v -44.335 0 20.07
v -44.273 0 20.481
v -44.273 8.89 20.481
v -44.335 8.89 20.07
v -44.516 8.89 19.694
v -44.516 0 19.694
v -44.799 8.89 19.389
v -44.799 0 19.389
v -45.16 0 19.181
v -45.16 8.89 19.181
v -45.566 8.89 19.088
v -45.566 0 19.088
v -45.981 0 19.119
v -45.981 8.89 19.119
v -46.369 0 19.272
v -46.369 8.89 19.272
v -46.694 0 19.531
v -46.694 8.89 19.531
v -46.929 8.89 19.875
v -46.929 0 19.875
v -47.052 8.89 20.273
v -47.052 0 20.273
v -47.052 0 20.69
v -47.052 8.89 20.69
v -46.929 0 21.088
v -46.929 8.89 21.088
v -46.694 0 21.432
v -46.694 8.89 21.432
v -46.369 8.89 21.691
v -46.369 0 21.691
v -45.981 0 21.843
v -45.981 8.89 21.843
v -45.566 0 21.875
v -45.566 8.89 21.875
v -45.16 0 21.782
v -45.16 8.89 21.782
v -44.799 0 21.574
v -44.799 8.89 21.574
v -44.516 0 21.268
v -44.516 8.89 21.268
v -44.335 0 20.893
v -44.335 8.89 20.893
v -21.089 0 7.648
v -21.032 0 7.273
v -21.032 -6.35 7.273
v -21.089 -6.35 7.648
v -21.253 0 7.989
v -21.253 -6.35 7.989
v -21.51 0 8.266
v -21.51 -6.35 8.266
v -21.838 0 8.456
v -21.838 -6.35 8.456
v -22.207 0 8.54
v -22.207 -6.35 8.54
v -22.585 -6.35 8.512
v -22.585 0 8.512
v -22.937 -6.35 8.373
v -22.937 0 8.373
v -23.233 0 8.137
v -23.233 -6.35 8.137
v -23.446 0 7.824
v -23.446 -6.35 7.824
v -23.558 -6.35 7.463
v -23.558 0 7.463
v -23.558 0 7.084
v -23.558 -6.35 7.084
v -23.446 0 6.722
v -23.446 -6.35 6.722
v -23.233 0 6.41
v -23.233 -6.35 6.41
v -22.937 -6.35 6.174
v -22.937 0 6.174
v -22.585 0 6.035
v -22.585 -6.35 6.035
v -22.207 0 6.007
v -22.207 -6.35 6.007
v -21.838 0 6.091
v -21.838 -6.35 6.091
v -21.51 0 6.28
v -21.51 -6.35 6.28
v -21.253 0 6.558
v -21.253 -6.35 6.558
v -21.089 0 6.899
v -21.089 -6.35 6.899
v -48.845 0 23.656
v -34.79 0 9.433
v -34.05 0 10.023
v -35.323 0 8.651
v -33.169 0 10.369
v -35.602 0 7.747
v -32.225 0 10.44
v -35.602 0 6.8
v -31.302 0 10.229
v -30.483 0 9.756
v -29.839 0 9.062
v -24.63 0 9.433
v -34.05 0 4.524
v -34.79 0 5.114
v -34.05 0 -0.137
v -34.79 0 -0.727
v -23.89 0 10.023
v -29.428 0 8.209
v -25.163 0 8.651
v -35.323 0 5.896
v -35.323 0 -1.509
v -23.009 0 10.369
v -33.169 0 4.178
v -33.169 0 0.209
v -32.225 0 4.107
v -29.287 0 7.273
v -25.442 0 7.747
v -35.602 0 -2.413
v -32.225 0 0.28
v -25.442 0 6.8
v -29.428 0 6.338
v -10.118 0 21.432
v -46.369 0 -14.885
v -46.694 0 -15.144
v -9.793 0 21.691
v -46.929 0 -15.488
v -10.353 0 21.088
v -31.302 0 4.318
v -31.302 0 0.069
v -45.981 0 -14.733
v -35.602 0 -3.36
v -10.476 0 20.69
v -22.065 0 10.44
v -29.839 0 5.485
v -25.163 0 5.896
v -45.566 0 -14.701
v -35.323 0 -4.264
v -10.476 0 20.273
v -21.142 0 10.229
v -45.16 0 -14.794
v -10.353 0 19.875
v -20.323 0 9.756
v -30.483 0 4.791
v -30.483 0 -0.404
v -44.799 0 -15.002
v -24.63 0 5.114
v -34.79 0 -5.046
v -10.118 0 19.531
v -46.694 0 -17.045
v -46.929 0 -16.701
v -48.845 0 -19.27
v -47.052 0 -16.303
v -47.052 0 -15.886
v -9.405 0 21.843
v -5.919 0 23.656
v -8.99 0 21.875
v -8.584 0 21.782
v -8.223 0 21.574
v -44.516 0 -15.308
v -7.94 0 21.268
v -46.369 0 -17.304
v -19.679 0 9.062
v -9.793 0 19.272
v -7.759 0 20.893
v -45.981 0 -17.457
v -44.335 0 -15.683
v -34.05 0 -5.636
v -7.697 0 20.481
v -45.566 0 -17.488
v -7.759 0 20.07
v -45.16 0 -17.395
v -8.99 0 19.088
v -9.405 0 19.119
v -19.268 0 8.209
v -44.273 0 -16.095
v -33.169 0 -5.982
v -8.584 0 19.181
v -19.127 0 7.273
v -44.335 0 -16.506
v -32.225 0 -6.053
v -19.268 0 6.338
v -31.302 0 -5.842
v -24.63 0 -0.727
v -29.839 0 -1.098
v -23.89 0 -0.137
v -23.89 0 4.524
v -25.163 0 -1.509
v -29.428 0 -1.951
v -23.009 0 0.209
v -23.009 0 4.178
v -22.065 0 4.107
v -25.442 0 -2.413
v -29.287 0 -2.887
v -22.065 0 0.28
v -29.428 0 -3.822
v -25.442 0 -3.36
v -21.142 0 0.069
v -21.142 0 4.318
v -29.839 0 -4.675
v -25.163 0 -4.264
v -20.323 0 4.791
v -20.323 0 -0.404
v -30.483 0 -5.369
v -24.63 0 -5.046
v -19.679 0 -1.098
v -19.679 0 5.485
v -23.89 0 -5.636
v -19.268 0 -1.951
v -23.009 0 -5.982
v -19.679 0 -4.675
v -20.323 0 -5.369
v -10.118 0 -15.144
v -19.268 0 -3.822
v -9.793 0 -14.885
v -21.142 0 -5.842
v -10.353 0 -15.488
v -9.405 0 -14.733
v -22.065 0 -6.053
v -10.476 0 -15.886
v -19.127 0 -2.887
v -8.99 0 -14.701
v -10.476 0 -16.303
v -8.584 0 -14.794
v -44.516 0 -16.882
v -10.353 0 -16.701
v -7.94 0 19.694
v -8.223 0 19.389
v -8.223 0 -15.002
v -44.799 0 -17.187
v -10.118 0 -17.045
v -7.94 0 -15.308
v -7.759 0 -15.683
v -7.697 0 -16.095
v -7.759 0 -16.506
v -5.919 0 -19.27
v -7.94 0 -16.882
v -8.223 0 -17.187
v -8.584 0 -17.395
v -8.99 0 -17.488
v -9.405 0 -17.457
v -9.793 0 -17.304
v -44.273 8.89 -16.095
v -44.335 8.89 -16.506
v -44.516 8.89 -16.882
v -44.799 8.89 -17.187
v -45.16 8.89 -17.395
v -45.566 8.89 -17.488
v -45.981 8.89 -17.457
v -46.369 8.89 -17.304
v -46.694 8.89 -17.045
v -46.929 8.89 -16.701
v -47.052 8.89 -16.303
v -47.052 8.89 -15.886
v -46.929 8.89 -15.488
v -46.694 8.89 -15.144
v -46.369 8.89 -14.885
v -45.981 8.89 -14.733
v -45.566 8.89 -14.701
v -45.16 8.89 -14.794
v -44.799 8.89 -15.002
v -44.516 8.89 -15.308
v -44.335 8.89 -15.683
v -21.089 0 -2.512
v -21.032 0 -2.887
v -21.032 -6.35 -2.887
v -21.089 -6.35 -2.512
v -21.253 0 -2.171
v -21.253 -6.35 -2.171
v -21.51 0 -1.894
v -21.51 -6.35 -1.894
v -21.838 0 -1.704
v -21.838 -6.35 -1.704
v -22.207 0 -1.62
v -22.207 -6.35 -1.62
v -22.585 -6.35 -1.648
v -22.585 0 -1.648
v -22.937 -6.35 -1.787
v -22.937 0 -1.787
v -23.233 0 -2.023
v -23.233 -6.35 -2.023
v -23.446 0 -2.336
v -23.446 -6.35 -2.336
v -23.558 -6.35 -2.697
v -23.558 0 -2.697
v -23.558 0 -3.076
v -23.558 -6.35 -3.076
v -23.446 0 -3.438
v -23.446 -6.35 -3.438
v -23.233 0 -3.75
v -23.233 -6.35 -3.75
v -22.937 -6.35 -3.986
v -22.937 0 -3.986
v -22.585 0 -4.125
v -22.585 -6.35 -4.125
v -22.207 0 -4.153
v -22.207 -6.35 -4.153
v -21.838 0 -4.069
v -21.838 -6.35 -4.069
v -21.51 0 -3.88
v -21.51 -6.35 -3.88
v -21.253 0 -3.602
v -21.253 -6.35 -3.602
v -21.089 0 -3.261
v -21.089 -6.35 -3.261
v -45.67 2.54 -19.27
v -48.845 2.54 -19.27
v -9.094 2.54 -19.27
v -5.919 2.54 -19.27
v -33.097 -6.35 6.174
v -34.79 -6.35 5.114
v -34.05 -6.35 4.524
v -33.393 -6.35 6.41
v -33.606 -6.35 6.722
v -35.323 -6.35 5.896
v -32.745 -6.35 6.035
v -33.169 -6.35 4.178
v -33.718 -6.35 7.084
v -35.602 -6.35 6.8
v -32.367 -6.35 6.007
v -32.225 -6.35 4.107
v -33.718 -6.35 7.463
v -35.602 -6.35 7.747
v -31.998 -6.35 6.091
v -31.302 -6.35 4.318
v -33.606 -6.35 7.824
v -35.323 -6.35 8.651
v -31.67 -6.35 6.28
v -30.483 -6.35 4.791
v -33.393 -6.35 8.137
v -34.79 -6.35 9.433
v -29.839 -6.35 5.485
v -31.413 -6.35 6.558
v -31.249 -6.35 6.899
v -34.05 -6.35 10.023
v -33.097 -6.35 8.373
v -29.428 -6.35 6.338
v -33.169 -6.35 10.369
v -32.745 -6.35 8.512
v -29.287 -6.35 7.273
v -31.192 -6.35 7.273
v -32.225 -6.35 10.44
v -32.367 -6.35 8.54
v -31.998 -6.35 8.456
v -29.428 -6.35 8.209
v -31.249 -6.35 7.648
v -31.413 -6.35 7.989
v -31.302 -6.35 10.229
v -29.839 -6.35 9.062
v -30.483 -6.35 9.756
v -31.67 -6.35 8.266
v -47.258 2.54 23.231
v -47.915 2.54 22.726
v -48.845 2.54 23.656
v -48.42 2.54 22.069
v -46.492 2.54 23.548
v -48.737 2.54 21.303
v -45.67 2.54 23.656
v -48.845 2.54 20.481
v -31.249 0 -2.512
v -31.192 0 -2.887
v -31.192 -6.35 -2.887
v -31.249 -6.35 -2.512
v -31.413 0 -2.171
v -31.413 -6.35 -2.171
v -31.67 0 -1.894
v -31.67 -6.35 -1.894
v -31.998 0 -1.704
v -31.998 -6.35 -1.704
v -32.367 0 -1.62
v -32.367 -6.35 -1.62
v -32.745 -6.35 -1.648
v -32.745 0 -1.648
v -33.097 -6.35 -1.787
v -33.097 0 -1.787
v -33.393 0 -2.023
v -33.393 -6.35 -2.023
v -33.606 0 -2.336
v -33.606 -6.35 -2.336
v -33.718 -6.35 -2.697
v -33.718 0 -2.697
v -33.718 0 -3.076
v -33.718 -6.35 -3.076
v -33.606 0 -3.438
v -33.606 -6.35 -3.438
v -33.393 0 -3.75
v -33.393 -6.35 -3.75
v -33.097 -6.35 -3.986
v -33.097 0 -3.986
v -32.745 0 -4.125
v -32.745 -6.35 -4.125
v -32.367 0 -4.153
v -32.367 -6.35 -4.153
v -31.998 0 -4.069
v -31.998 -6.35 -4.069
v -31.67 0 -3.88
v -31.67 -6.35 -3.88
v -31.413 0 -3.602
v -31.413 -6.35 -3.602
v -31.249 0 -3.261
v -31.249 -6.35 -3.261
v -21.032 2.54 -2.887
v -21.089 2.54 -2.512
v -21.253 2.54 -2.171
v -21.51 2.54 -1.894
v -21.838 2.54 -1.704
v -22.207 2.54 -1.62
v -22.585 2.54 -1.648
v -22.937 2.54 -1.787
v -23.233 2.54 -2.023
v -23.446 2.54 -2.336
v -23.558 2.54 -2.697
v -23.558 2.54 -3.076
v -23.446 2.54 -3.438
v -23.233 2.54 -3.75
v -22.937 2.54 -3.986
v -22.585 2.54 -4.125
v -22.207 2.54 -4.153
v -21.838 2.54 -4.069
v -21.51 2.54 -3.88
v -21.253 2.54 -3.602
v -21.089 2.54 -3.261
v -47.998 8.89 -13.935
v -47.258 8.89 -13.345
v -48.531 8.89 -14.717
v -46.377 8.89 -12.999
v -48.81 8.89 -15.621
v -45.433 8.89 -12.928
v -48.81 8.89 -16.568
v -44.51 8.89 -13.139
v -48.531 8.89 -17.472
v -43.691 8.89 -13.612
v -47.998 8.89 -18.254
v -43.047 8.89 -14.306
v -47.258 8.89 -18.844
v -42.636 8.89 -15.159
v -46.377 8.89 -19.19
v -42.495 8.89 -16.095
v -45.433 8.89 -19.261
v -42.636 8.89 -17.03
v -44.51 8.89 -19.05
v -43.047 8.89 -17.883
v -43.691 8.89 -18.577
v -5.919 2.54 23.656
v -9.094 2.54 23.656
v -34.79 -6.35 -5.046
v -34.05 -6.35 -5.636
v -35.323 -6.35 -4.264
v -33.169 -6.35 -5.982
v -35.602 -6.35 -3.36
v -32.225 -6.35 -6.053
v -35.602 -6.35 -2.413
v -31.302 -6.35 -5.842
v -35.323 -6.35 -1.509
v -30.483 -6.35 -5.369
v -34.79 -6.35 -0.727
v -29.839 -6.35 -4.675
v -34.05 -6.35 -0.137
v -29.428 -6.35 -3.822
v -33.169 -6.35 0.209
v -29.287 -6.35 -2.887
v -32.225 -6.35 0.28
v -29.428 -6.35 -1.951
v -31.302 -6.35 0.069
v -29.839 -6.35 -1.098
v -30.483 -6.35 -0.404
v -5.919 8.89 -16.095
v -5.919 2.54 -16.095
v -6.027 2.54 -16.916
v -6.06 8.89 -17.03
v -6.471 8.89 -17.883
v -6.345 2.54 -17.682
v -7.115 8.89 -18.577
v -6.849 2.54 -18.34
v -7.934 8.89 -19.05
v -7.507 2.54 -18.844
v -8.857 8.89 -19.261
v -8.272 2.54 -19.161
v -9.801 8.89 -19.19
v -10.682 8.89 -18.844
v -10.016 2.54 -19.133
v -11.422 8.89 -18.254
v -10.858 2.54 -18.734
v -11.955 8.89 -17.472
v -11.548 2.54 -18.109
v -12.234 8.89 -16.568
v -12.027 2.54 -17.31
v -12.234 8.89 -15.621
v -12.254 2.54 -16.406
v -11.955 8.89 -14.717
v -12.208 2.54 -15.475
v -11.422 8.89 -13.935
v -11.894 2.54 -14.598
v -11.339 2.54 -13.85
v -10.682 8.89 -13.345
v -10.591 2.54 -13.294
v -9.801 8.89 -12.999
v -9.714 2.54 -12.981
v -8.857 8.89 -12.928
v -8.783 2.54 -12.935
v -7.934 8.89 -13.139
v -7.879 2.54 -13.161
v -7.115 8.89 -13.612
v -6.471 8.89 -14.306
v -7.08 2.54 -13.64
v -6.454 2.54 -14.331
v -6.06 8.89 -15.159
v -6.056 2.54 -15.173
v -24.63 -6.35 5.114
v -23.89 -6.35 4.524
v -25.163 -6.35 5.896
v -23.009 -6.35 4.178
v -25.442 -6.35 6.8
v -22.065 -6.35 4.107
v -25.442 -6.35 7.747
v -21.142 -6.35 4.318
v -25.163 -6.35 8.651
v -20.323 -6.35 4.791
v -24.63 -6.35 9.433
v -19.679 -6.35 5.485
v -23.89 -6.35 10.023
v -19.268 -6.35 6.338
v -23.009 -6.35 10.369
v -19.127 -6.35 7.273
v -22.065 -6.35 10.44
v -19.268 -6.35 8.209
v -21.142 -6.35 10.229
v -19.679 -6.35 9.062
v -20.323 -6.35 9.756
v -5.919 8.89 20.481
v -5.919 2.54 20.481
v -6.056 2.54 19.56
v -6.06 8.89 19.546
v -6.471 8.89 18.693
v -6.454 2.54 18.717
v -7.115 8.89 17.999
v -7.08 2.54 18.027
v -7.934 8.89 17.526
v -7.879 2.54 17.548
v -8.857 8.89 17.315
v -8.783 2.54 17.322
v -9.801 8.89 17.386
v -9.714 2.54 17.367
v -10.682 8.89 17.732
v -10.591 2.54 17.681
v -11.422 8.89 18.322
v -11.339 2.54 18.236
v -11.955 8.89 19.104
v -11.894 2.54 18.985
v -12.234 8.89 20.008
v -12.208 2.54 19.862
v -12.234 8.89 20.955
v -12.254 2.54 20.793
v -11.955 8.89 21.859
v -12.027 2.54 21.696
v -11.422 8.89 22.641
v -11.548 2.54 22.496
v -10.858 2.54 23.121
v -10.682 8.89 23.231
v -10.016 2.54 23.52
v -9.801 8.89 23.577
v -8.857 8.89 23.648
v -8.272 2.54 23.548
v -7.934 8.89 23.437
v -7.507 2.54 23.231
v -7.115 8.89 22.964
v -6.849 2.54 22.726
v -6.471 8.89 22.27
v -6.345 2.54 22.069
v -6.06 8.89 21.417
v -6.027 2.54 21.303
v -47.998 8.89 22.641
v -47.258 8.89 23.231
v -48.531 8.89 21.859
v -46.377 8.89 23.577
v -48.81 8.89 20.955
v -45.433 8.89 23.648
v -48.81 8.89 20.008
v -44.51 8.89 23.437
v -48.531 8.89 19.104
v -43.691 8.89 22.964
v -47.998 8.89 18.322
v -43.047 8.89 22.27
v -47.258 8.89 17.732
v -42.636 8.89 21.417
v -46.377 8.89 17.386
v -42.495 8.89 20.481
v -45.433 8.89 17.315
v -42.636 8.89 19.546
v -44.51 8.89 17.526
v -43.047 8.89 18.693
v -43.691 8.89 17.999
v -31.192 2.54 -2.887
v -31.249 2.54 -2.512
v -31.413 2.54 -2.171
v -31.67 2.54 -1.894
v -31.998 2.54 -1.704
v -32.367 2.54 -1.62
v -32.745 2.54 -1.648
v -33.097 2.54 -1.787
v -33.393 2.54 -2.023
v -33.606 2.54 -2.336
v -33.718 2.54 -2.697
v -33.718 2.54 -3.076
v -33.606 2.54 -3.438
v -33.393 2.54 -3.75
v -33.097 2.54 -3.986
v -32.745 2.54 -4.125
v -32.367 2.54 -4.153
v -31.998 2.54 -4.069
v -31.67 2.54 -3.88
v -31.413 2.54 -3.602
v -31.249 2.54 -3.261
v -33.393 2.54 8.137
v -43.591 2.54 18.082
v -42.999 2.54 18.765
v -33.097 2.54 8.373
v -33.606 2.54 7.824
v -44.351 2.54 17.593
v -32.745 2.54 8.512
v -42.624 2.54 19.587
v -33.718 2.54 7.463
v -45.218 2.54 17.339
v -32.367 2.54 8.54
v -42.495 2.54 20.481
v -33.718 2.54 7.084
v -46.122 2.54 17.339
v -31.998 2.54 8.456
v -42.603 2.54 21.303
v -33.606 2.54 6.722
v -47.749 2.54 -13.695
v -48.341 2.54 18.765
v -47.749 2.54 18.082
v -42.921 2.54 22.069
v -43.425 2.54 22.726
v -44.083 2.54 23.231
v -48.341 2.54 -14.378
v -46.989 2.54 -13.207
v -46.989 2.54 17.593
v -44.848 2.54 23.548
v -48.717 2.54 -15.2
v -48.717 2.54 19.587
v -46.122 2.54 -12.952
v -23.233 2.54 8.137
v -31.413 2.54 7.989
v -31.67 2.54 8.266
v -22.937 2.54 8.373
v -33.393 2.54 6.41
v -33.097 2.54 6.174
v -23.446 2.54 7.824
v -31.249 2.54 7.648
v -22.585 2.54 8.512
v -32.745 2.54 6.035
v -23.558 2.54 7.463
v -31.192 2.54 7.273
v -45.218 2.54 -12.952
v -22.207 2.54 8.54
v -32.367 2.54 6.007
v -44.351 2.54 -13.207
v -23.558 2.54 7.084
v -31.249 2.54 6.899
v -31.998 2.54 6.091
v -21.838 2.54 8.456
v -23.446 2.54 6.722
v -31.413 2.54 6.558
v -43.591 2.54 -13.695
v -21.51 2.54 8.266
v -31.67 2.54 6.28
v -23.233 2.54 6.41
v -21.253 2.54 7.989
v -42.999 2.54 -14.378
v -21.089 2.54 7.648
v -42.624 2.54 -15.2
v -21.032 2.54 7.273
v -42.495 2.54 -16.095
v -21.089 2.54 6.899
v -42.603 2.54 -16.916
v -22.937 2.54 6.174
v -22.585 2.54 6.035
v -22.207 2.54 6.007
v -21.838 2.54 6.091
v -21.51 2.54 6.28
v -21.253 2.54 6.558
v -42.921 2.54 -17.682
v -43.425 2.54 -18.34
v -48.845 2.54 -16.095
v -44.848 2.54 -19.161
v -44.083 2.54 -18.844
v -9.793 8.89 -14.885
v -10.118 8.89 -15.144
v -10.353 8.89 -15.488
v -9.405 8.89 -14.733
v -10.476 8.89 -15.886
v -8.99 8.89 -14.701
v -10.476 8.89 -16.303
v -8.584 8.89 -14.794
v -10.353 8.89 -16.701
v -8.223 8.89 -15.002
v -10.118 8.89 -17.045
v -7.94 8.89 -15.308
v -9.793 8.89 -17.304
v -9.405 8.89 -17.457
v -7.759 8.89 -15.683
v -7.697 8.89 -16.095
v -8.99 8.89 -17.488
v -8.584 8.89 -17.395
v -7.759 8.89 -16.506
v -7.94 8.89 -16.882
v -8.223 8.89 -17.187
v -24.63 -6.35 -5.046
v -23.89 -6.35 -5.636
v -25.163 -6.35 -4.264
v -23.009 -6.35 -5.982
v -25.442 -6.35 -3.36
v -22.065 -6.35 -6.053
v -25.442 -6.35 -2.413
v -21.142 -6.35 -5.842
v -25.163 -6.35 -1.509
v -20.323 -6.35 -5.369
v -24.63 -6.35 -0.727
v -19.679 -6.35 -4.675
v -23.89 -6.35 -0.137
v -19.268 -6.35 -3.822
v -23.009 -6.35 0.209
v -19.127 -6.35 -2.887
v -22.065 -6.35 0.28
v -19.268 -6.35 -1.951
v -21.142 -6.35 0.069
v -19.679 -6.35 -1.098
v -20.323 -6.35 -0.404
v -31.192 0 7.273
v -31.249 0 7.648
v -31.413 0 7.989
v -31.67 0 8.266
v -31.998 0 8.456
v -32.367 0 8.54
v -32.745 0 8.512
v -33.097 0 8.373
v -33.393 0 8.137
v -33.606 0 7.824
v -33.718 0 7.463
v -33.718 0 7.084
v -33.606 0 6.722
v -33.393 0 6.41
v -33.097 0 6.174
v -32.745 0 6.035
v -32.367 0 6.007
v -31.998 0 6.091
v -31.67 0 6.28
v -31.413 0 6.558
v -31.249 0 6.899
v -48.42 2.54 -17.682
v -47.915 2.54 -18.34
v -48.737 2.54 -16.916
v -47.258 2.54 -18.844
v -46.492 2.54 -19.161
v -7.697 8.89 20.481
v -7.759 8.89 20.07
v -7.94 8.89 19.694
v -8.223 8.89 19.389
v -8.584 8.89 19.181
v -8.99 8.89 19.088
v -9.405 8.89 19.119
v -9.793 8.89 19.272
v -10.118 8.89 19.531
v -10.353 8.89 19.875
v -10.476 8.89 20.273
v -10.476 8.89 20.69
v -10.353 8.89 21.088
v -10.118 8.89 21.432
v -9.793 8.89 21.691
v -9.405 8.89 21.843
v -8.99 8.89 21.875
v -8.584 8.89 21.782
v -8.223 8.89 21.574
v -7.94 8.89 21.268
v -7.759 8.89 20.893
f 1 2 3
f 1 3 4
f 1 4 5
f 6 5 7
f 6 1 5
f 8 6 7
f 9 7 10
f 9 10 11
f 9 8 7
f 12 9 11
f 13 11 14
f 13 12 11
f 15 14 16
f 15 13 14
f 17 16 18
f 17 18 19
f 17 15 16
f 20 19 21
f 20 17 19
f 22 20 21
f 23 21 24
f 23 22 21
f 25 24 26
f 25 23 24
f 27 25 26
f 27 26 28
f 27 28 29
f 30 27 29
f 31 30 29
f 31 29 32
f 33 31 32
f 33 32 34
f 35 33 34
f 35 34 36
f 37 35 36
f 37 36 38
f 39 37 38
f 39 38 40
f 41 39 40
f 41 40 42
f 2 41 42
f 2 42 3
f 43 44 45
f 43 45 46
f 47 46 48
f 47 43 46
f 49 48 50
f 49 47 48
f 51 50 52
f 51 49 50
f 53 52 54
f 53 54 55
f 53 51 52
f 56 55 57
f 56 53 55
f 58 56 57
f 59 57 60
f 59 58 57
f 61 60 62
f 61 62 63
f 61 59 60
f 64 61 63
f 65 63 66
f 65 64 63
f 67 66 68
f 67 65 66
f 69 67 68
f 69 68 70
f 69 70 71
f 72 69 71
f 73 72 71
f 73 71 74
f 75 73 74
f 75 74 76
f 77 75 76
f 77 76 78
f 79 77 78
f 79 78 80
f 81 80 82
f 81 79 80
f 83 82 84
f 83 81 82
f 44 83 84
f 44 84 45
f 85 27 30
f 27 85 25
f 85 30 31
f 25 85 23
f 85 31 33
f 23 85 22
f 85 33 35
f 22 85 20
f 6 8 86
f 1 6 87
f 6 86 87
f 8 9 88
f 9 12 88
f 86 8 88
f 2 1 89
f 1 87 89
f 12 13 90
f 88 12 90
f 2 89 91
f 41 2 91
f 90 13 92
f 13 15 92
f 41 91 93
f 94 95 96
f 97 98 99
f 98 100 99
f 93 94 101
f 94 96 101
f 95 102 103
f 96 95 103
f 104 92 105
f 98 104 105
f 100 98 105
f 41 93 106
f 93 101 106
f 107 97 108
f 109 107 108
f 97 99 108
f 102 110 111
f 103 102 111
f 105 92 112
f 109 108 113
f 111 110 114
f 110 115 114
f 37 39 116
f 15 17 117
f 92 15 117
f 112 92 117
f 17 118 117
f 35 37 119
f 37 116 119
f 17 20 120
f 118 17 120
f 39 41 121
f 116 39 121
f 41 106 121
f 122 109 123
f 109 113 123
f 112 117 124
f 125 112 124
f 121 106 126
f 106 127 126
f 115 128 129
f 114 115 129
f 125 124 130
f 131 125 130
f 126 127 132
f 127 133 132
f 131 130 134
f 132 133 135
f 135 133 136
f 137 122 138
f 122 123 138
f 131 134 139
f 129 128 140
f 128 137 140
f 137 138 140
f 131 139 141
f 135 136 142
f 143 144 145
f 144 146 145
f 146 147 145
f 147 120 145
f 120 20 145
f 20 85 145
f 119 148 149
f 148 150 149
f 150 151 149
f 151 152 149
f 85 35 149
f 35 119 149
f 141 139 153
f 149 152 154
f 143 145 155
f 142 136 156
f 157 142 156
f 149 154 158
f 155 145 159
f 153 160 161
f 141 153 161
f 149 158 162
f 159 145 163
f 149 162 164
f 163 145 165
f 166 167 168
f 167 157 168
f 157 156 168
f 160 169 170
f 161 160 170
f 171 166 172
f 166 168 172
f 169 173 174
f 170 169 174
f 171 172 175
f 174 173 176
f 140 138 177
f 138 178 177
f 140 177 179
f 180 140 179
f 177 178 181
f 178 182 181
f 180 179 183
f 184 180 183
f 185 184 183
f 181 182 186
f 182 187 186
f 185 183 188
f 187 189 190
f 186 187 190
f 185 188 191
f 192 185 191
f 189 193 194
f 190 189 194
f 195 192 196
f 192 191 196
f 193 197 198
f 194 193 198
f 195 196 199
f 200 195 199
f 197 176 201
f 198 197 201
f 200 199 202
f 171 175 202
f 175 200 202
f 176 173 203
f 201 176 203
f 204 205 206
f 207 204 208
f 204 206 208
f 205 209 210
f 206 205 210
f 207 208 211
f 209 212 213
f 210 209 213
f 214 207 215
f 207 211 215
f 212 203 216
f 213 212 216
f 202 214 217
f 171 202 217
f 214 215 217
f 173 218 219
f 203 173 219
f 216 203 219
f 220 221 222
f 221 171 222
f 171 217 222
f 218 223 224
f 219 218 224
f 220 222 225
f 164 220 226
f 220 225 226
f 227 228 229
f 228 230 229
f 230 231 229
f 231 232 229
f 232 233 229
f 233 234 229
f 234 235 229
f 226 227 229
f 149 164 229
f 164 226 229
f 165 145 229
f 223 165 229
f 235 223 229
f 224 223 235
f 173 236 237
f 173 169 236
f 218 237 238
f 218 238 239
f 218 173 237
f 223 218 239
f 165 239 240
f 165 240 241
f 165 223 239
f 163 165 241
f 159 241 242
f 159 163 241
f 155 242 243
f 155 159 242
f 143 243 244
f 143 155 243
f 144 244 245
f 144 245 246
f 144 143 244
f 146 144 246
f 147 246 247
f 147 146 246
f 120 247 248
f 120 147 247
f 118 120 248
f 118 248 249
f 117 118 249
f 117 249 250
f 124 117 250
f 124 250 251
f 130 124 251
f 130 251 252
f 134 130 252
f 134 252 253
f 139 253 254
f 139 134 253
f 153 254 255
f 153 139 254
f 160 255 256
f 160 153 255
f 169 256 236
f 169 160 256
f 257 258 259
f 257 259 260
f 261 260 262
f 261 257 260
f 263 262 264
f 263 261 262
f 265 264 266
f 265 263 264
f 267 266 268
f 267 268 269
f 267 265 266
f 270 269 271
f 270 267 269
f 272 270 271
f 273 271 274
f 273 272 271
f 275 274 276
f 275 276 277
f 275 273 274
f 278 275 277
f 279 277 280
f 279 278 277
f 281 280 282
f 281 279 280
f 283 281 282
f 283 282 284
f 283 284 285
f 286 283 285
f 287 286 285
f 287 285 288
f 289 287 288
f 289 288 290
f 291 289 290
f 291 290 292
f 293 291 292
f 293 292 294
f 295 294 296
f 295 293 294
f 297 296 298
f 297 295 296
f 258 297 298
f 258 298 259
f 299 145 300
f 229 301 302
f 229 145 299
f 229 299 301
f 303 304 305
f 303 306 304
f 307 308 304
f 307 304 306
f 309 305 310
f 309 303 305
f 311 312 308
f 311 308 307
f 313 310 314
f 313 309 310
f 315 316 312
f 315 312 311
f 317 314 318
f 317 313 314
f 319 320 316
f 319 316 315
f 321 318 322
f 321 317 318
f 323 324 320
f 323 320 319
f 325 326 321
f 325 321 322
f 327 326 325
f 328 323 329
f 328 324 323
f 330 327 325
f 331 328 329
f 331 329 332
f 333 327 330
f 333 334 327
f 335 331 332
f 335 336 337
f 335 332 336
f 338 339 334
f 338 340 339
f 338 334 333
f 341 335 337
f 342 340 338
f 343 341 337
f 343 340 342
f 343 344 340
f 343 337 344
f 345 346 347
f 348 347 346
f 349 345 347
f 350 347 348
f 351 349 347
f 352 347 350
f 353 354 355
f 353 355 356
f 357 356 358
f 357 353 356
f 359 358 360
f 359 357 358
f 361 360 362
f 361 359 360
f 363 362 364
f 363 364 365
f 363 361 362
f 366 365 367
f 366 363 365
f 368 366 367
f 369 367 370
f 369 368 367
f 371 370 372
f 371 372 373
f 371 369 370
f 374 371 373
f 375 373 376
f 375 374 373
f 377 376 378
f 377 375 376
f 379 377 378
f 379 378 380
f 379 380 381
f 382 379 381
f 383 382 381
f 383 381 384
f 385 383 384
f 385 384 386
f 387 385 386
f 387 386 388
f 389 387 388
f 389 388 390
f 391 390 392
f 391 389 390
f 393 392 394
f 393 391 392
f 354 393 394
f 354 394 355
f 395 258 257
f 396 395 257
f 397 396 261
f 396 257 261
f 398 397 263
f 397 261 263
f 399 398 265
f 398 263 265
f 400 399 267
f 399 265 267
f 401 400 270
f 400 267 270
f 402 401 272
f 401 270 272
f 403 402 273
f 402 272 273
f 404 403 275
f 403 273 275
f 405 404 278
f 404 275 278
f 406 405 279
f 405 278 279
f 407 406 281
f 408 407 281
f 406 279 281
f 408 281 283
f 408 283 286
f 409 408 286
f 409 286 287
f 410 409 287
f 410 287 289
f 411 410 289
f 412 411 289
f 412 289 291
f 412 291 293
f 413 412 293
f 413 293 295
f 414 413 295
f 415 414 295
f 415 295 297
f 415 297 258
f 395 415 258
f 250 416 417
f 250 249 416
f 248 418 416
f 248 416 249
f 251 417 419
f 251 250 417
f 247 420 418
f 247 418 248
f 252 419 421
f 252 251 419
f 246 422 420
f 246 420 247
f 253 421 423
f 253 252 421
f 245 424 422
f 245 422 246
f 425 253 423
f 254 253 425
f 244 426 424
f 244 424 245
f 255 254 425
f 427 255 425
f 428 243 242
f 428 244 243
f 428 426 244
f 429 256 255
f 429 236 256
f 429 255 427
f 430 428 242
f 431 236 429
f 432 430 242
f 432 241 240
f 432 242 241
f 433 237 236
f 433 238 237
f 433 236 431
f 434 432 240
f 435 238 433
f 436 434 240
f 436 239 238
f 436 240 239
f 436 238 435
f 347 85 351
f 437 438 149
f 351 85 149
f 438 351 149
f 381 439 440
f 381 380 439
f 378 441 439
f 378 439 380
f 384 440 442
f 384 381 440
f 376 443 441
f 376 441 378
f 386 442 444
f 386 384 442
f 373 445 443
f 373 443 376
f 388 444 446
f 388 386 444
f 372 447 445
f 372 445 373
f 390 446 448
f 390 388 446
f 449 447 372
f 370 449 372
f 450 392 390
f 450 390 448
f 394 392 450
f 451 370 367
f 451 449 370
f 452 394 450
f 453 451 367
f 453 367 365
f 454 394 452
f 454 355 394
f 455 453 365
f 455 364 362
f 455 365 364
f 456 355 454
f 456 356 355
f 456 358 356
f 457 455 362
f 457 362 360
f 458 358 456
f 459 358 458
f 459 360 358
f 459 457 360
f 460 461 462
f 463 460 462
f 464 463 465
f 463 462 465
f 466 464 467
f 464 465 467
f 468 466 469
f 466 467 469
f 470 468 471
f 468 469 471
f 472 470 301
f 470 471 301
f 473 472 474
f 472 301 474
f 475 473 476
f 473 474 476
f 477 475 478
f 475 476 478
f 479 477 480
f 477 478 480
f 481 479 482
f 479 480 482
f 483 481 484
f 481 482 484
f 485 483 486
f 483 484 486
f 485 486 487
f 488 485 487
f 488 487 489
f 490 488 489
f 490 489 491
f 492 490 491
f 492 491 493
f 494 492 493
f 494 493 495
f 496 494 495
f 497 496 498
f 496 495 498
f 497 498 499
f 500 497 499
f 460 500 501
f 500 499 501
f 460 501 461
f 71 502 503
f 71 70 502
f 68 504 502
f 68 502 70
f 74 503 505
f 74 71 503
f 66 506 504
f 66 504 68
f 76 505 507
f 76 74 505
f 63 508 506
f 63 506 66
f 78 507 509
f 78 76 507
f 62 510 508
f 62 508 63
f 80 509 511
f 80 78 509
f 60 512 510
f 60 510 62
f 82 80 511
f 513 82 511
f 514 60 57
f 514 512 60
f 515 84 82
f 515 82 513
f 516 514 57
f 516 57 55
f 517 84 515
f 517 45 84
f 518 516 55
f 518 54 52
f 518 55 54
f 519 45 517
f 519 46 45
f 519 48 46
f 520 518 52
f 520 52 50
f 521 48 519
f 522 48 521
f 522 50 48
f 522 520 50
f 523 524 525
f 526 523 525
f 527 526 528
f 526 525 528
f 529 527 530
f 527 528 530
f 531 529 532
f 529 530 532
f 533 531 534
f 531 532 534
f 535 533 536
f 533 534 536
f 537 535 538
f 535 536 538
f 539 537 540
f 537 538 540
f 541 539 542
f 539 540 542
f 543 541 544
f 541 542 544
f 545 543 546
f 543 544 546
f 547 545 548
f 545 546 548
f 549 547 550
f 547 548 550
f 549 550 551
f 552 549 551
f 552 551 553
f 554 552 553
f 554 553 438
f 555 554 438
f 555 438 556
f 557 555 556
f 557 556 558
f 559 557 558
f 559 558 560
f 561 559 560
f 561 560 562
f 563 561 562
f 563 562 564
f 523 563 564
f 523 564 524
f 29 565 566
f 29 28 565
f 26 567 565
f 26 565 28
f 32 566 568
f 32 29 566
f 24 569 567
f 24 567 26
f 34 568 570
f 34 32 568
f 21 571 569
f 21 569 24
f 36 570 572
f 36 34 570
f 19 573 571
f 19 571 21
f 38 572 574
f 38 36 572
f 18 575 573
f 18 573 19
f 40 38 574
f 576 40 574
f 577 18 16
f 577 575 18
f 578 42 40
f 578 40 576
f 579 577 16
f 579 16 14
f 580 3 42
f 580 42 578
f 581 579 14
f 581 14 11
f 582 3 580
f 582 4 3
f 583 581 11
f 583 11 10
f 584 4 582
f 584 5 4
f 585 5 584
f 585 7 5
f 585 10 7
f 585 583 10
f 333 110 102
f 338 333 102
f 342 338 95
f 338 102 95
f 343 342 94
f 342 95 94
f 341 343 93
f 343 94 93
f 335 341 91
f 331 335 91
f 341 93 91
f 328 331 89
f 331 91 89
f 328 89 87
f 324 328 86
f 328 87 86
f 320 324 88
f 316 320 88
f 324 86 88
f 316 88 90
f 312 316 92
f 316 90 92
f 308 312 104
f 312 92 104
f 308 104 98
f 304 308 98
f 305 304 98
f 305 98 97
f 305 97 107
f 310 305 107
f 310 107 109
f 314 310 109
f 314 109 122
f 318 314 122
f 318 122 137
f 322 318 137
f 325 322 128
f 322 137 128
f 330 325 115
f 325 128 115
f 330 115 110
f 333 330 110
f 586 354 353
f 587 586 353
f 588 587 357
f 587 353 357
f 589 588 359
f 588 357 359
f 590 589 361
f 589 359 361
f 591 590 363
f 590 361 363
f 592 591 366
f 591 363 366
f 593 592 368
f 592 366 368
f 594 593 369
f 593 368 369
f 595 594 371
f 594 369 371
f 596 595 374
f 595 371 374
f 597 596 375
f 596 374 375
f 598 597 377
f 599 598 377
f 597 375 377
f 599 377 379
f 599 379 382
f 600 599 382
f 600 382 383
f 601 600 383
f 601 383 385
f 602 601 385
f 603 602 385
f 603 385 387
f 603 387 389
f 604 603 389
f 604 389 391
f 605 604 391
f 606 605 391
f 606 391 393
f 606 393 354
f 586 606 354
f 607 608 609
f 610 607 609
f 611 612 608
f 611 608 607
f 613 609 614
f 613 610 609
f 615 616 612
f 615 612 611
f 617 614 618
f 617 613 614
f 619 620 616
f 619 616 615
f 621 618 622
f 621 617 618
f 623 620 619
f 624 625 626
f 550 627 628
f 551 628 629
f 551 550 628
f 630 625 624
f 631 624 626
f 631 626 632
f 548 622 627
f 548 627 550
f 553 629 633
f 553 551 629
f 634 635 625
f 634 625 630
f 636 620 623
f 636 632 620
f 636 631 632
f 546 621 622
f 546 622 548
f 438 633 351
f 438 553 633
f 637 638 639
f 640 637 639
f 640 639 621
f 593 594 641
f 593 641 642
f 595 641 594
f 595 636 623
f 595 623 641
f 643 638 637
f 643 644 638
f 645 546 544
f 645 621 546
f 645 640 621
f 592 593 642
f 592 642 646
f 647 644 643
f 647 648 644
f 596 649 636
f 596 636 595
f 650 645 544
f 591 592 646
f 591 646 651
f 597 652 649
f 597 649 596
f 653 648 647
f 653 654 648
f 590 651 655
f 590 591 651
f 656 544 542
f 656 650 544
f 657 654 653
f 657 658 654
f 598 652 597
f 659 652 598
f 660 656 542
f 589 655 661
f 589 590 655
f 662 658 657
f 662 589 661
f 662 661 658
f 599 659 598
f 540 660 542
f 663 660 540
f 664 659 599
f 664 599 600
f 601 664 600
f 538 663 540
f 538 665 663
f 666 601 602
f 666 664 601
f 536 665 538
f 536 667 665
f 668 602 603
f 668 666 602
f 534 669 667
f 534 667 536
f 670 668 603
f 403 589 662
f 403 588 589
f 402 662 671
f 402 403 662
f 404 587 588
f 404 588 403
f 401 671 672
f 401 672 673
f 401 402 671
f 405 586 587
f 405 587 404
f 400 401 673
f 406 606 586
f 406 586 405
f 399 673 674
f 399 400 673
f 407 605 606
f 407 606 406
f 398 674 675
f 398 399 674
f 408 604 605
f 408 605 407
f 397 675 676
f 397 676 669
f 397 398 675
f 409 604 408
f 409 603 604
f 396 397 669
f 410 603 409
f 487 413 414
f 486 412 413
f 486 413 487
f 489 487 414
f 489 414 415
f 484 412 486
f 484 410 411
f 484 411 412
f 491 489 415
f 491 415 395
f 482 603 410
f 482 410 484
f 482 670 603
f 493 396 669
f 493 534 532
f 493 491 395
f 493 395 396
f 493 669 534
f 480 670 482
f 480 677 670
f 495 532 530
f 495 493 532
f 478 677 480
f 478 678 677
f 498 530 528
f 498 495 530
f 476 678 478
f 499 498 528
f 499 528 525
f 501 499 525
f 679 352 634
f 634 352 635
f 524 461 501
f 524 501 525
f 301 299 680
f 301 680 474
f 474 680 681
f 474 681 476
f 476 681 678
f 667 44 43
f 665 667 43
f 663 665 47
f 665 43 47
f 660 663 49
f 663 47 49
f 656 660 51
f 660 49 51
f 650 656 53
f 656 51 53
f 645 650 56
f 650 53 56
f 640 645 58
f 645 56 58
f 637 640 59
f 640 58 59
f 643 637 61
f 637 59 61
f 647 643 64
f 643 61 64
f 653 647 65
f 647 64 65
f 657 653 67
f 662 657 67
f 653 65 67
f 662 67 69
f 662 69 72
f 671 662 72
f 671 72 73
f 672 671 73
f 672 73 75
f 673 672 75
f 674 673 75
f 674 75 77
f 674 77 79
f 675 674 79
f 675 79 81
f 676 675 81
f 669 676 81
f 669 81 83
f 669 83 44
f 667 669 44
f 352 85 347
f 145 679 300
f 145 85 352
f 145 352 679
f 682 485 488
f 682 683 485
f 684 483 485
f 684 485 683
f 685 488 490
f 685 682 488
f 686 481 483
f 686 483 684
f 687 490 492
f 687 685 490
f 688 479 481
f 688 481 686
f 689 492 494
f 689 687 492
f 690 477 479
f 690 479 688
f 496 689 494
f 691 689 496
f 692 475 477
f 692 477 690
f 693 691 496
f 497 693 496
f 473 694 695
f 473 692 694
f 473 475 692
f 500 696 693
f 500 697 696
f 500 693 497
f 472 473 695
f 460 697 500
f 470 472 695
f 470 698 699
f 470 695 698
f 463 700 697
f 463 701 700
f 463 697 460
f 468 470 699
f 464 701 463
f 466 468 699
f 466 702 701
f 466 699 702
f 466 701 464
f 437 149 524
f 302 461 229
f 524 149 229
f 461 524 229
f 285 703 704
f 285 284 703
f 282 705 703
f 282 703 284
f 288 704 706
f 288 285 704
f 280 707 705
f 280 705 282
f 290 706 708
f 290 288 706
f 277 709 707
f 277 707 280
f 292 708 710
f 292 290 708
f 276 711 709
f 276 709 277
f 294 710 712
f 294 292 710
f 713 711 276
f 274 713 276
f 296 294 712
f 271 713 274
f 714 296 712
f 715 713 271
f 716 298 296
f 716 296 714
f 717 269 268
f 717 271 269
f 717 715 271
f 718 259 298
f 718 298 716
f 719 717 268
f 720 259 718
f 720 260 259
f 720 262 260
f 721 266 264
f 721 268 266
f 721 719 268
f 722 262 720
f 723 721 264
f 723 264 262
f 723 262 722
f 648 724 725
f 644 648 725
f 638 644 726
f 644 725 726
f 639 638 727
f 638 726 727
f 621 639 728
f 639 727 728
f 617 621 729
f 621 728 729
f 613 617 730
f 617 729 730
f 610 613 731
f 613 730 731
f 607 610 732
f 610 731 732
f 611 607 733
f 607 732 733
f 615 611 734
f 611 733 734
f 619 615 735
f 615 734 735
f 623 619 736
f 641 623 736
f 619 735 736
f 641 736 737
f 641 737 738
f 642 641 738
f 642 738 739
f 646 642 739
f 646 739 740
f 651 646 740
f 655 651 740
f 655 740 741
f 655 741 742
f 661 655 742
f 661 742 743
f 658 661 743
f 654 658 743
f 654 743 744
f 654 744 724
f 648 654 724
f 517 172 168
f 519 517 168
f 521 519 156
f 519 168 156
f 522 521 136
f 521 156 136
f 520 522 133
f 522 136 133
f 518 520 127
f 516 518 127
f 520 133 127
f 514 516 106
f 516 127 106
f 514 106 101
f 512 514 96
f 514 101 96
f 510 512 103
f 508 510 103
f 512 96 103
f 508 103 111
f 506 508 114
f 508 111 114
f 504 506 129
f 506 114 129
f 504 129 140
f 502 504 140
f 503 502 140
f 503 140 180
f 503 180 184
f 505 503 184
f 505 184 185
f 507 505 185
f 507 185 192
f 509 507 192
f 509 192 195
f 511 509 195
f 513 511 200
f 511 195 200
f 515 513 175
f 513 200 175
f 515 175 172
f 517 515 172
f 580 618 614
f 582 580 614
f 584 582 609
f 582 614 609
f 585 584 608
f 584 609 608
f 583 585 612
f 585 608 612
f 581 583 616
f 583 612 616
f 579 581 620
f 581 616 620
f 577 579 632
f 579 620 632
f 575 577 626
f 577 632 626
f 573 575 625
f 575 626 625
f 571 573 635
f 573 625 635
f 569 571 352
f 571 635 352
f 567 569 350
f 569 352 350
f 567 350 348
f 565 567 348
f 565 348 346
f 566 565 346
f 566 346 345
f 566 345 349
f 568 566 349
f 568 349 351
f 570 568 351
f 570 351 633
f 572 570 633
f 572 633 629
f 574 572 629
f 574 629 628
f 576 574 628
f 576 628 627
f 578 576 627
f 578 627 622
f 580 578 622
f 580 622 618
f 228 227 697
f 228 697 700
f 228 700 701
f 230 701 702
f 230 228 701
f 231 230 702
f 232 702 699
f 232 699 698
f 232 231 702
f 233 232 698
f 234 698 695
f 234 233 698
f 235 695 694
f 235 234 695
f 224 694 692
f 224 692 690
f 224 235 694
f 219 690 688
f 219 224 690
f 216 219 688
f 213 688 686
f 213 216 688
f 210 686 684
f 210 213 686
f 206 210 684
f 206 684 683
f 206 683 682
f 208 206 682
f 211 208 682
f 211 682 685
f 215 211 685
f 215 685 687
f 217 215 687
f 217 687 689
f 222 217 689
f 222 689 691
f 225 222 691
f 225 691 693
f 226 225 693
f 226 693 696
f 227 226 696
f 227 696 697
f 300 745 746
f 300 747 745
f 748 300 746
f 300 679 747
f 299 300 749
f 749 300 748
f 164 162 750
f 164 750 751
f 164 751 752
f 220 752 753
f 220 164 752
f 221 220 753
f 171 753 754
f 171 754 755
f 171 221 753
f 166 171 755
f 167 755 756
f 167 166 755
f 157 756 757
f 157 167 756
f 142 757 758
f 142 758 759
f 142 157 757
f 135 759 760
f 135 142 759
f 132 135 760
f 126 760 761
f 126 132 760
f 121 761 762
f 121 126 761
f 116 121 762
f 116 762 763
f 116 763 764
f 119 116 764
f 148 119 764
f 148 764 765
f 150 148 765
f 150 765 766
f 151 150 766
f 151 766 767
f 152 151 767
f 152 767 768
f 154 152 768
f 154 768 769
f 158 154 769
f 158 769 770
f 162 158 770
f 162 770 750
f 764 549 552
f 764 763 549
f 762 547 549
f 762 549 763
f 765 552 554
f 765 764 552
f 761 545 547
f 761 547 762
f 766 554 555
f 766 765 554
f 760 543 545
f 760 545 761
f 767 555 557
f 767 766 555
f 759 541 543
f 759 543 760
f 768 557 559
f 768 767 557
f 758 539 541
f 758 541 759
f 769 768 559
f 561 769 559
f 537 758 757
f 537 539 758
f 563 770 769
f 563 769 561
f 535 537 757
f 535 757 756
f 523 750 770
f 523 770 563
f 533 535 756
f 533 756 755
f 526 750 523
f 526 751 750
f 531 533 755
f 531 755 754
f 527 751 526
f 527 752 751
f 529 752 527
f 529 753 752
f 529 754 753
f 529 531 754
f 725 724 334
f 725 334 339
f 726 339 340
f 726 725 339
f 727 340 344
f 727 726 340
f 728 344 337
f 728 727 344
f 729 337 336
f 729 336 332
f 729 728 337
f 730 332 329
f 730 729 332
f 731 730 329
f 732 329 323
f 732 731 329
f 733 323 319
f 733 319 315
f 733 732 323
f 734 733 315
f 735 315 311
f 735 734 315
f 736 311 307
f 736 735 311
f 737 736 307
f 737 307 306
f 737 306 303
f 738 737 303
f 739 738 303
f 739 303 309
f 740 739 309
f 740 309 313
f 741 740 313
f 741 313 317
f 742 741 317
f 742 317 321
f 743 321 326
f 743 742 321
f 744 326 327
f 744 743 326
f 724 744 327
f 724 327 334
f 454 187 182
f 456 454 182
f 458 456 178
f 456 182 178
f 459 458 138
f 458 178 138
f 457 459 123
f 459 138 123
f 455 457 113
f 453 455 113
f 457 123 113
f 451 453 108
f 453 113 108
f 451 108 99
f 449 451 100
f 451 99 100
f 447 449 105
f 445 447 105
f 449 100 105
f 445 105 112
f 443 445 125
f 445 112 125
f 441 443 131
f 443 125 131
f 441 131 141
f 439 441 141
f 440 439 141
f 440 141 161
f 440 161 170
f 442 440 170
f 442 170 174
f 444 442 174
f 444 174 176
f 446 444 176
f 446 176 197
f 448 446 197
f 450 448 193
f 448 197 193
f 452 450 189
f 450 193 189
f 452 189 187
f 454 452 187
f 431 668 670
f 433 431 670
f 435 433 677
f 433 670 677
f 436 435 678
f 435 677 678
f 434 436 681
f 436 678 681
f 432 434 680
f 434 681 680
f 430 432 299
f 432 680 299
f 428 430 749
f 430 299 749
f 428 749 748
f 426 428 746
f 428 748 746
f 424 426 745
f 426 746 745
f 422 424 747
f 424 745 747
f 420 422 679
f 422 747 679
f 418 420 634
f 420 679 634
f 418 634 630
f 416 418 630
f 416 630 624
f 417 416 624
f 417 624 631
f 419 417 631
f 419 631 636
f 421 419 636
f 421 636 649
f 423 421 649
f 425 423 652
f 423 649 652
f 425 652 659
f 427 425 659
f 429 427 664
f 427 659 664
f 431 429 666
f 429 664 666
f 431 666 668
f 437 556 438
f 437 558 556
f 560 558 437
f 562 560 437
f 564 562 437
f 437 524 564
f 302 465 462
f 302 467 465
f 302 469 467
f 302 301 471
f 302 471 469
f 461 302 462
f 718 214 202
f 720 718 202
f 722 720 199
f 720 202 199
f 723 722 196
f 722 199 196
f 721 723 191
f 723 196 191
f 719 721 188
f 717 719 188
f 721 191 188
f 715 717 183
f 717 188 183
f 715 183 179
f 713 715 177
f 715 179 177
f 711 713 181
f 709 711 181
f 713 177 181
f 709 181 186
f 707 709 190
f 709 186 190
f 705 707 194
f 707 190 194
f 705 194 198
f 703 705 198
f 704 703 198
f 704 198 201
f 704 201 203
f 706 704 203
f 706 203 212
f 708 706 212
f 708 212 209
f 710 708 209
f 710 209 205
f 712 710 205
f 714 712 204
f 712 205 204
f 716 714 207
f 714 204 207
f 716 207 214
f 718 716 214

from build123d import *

# Parameters (mm, degrees)
SKETCH1_W           = 42.926
SKETCH1_H           = 42.926
SKETCH1_R           = 1.397
BOSS_EXTRUDE1_DEPTH = 2.54
SKETCH2_R           = 3.175
SKETCH2_R_2         = 1.397
BOSS_EXTRUDE2_DEPTH = 6.35
SKETCH3_R           = 3.175
SKETCH3_R_2         = 1.27
BOSS_EXTRUDE3_DEPTH = 6.35
SKETCH4_R           = 1.27
CUT_EXTRUDE1_DEPTH  = 9.89


with BuildPart() as part:
    # Sketch1 → Boss-Extrude1 (new body)
    with BuildSketch(Plane(origin=(0, 0, 0), x_dir=(1, 0, 0), z_dir=(0, 1, 0))):
        with Locations((-27.382131523, -2.193417639)):
            Rectangle(SKETCH1_W, SKETCH1_H)
        with Locations((-45.670131523, 16.094582361)):
            Circle(SKETCH1_R, mode=Mode.SUBTRACT)
        with Locations((-9.094131523, 16.094582361)):
            Circle(SKETCH1_R, mode=Mode.SUBTRACT)
        with Locations((-45.670131523, -20.481417639)):
            Circle(SKETCH1_R, mode=Mode.SUBTRACT)
        with Locations((-9.094131523, -20.481417639)):
            Circle(SKETCH1_R, mode=Mode.SUBTRACT)
    extrude(amount=BOSS_EXTRUDE1_DEPTH)

    # Sketch2 → Boss-Extrude2 (add)
    with BuildSketch(Plane(origin=(0, 2.54, 0), x_dir=(1, 0, 0), z_dir=(0, 1, 0))):
        with Locations((-45.670131523, 16.094582361)):
            Circle(SKETCH2_R)
        with Locations((-45.670131523, 16.094582361)):
            Circle(SKETCH2_R_2, mode=Mode.SUBTRACT)
        with Locations((-9.094131523, 16.094582361)):
            Circle(SKETCH2_R)
        with Locations((-9.094131523, 16.094582361)):
            Circle(SKETCH2_R_2, mode=Mode.SUBTRACT)
        with Locations((-9.094131523, -20.481417639)):
            Circle(SKETCH2_R)
        with Locations((-9.094131523, -20.481417639)):
            Circle(SKETCH2_R_2, mode=Mode.SUBTRACT)
        with Locations((-45.670131523, -20.481417639)):
            Circle(SKETCH2_R)
        with Locations((-45.670131523, -20.481417639)):
            Circle(SKETCH2_R_2, mode=Mode.SUBTRACT)
    extrude(amount=BOSS_EXTRUDE2_DEPTH)

    # Sketch3 → Boss-Extrude3 (add)
    with BuildSketch(Plane.XZ):
        with Locations((-32.462131523, 7.273417639)):
            Circle(SKETCH3_R)
        with Locations((-32.462131523, 7.273417639)):
            Circle(SKETCH3_R_2, mode=Mode.SUBTRACT)
        with Locations((-22.302131523, 7.273417639)):
            Circle(SKETCH3_R)
        with Locations((-22.302131523, 7.273417639)):
            Circle(SKETCH3_R_2, mode=Mode.SUBTRACT)
        with Locations((-22.302131523, -2.886582361)):
            Circle(SKETCH3_R)
        with Locations((-22.302131523, -2.886582361)):
            Circle(SKETCH3_R_2, mode=Mode.SUBTRACT)
        with Locations((-32.462131523, -2.886582361)):
            Circle(SKETCH3_R)
        with Locations((-32.462131523, -2.886582361)):
            Circle(SKETCH3_R_2, mode=Mode.SUBTRACT)
    extrude(amount=BOSS_EXTRUDE3_DEPTH)

    # Sketch4 → Cut-Extrude1 (cut, through all)
    with BuildSketch(Plane.XZ):
        with Locations((-32.462131523, -2.886582361)):
            Circle(SKETCH4_R)
        with Locations((-32.462131523, 7.273417639)):
            Circle(SKETCH4_R)
        with Locations((-22.302131523, -2.886582361)):
            Circle(SKETCH4_R)
        with Locations((-22.302131523, 7.273417639)):
            Circle(SKETCH4_R)
    extrude(amount=-CUT_EXTRUDE1_DEPTH, mode=Mode.SUBTRACT)


solid = part.part
